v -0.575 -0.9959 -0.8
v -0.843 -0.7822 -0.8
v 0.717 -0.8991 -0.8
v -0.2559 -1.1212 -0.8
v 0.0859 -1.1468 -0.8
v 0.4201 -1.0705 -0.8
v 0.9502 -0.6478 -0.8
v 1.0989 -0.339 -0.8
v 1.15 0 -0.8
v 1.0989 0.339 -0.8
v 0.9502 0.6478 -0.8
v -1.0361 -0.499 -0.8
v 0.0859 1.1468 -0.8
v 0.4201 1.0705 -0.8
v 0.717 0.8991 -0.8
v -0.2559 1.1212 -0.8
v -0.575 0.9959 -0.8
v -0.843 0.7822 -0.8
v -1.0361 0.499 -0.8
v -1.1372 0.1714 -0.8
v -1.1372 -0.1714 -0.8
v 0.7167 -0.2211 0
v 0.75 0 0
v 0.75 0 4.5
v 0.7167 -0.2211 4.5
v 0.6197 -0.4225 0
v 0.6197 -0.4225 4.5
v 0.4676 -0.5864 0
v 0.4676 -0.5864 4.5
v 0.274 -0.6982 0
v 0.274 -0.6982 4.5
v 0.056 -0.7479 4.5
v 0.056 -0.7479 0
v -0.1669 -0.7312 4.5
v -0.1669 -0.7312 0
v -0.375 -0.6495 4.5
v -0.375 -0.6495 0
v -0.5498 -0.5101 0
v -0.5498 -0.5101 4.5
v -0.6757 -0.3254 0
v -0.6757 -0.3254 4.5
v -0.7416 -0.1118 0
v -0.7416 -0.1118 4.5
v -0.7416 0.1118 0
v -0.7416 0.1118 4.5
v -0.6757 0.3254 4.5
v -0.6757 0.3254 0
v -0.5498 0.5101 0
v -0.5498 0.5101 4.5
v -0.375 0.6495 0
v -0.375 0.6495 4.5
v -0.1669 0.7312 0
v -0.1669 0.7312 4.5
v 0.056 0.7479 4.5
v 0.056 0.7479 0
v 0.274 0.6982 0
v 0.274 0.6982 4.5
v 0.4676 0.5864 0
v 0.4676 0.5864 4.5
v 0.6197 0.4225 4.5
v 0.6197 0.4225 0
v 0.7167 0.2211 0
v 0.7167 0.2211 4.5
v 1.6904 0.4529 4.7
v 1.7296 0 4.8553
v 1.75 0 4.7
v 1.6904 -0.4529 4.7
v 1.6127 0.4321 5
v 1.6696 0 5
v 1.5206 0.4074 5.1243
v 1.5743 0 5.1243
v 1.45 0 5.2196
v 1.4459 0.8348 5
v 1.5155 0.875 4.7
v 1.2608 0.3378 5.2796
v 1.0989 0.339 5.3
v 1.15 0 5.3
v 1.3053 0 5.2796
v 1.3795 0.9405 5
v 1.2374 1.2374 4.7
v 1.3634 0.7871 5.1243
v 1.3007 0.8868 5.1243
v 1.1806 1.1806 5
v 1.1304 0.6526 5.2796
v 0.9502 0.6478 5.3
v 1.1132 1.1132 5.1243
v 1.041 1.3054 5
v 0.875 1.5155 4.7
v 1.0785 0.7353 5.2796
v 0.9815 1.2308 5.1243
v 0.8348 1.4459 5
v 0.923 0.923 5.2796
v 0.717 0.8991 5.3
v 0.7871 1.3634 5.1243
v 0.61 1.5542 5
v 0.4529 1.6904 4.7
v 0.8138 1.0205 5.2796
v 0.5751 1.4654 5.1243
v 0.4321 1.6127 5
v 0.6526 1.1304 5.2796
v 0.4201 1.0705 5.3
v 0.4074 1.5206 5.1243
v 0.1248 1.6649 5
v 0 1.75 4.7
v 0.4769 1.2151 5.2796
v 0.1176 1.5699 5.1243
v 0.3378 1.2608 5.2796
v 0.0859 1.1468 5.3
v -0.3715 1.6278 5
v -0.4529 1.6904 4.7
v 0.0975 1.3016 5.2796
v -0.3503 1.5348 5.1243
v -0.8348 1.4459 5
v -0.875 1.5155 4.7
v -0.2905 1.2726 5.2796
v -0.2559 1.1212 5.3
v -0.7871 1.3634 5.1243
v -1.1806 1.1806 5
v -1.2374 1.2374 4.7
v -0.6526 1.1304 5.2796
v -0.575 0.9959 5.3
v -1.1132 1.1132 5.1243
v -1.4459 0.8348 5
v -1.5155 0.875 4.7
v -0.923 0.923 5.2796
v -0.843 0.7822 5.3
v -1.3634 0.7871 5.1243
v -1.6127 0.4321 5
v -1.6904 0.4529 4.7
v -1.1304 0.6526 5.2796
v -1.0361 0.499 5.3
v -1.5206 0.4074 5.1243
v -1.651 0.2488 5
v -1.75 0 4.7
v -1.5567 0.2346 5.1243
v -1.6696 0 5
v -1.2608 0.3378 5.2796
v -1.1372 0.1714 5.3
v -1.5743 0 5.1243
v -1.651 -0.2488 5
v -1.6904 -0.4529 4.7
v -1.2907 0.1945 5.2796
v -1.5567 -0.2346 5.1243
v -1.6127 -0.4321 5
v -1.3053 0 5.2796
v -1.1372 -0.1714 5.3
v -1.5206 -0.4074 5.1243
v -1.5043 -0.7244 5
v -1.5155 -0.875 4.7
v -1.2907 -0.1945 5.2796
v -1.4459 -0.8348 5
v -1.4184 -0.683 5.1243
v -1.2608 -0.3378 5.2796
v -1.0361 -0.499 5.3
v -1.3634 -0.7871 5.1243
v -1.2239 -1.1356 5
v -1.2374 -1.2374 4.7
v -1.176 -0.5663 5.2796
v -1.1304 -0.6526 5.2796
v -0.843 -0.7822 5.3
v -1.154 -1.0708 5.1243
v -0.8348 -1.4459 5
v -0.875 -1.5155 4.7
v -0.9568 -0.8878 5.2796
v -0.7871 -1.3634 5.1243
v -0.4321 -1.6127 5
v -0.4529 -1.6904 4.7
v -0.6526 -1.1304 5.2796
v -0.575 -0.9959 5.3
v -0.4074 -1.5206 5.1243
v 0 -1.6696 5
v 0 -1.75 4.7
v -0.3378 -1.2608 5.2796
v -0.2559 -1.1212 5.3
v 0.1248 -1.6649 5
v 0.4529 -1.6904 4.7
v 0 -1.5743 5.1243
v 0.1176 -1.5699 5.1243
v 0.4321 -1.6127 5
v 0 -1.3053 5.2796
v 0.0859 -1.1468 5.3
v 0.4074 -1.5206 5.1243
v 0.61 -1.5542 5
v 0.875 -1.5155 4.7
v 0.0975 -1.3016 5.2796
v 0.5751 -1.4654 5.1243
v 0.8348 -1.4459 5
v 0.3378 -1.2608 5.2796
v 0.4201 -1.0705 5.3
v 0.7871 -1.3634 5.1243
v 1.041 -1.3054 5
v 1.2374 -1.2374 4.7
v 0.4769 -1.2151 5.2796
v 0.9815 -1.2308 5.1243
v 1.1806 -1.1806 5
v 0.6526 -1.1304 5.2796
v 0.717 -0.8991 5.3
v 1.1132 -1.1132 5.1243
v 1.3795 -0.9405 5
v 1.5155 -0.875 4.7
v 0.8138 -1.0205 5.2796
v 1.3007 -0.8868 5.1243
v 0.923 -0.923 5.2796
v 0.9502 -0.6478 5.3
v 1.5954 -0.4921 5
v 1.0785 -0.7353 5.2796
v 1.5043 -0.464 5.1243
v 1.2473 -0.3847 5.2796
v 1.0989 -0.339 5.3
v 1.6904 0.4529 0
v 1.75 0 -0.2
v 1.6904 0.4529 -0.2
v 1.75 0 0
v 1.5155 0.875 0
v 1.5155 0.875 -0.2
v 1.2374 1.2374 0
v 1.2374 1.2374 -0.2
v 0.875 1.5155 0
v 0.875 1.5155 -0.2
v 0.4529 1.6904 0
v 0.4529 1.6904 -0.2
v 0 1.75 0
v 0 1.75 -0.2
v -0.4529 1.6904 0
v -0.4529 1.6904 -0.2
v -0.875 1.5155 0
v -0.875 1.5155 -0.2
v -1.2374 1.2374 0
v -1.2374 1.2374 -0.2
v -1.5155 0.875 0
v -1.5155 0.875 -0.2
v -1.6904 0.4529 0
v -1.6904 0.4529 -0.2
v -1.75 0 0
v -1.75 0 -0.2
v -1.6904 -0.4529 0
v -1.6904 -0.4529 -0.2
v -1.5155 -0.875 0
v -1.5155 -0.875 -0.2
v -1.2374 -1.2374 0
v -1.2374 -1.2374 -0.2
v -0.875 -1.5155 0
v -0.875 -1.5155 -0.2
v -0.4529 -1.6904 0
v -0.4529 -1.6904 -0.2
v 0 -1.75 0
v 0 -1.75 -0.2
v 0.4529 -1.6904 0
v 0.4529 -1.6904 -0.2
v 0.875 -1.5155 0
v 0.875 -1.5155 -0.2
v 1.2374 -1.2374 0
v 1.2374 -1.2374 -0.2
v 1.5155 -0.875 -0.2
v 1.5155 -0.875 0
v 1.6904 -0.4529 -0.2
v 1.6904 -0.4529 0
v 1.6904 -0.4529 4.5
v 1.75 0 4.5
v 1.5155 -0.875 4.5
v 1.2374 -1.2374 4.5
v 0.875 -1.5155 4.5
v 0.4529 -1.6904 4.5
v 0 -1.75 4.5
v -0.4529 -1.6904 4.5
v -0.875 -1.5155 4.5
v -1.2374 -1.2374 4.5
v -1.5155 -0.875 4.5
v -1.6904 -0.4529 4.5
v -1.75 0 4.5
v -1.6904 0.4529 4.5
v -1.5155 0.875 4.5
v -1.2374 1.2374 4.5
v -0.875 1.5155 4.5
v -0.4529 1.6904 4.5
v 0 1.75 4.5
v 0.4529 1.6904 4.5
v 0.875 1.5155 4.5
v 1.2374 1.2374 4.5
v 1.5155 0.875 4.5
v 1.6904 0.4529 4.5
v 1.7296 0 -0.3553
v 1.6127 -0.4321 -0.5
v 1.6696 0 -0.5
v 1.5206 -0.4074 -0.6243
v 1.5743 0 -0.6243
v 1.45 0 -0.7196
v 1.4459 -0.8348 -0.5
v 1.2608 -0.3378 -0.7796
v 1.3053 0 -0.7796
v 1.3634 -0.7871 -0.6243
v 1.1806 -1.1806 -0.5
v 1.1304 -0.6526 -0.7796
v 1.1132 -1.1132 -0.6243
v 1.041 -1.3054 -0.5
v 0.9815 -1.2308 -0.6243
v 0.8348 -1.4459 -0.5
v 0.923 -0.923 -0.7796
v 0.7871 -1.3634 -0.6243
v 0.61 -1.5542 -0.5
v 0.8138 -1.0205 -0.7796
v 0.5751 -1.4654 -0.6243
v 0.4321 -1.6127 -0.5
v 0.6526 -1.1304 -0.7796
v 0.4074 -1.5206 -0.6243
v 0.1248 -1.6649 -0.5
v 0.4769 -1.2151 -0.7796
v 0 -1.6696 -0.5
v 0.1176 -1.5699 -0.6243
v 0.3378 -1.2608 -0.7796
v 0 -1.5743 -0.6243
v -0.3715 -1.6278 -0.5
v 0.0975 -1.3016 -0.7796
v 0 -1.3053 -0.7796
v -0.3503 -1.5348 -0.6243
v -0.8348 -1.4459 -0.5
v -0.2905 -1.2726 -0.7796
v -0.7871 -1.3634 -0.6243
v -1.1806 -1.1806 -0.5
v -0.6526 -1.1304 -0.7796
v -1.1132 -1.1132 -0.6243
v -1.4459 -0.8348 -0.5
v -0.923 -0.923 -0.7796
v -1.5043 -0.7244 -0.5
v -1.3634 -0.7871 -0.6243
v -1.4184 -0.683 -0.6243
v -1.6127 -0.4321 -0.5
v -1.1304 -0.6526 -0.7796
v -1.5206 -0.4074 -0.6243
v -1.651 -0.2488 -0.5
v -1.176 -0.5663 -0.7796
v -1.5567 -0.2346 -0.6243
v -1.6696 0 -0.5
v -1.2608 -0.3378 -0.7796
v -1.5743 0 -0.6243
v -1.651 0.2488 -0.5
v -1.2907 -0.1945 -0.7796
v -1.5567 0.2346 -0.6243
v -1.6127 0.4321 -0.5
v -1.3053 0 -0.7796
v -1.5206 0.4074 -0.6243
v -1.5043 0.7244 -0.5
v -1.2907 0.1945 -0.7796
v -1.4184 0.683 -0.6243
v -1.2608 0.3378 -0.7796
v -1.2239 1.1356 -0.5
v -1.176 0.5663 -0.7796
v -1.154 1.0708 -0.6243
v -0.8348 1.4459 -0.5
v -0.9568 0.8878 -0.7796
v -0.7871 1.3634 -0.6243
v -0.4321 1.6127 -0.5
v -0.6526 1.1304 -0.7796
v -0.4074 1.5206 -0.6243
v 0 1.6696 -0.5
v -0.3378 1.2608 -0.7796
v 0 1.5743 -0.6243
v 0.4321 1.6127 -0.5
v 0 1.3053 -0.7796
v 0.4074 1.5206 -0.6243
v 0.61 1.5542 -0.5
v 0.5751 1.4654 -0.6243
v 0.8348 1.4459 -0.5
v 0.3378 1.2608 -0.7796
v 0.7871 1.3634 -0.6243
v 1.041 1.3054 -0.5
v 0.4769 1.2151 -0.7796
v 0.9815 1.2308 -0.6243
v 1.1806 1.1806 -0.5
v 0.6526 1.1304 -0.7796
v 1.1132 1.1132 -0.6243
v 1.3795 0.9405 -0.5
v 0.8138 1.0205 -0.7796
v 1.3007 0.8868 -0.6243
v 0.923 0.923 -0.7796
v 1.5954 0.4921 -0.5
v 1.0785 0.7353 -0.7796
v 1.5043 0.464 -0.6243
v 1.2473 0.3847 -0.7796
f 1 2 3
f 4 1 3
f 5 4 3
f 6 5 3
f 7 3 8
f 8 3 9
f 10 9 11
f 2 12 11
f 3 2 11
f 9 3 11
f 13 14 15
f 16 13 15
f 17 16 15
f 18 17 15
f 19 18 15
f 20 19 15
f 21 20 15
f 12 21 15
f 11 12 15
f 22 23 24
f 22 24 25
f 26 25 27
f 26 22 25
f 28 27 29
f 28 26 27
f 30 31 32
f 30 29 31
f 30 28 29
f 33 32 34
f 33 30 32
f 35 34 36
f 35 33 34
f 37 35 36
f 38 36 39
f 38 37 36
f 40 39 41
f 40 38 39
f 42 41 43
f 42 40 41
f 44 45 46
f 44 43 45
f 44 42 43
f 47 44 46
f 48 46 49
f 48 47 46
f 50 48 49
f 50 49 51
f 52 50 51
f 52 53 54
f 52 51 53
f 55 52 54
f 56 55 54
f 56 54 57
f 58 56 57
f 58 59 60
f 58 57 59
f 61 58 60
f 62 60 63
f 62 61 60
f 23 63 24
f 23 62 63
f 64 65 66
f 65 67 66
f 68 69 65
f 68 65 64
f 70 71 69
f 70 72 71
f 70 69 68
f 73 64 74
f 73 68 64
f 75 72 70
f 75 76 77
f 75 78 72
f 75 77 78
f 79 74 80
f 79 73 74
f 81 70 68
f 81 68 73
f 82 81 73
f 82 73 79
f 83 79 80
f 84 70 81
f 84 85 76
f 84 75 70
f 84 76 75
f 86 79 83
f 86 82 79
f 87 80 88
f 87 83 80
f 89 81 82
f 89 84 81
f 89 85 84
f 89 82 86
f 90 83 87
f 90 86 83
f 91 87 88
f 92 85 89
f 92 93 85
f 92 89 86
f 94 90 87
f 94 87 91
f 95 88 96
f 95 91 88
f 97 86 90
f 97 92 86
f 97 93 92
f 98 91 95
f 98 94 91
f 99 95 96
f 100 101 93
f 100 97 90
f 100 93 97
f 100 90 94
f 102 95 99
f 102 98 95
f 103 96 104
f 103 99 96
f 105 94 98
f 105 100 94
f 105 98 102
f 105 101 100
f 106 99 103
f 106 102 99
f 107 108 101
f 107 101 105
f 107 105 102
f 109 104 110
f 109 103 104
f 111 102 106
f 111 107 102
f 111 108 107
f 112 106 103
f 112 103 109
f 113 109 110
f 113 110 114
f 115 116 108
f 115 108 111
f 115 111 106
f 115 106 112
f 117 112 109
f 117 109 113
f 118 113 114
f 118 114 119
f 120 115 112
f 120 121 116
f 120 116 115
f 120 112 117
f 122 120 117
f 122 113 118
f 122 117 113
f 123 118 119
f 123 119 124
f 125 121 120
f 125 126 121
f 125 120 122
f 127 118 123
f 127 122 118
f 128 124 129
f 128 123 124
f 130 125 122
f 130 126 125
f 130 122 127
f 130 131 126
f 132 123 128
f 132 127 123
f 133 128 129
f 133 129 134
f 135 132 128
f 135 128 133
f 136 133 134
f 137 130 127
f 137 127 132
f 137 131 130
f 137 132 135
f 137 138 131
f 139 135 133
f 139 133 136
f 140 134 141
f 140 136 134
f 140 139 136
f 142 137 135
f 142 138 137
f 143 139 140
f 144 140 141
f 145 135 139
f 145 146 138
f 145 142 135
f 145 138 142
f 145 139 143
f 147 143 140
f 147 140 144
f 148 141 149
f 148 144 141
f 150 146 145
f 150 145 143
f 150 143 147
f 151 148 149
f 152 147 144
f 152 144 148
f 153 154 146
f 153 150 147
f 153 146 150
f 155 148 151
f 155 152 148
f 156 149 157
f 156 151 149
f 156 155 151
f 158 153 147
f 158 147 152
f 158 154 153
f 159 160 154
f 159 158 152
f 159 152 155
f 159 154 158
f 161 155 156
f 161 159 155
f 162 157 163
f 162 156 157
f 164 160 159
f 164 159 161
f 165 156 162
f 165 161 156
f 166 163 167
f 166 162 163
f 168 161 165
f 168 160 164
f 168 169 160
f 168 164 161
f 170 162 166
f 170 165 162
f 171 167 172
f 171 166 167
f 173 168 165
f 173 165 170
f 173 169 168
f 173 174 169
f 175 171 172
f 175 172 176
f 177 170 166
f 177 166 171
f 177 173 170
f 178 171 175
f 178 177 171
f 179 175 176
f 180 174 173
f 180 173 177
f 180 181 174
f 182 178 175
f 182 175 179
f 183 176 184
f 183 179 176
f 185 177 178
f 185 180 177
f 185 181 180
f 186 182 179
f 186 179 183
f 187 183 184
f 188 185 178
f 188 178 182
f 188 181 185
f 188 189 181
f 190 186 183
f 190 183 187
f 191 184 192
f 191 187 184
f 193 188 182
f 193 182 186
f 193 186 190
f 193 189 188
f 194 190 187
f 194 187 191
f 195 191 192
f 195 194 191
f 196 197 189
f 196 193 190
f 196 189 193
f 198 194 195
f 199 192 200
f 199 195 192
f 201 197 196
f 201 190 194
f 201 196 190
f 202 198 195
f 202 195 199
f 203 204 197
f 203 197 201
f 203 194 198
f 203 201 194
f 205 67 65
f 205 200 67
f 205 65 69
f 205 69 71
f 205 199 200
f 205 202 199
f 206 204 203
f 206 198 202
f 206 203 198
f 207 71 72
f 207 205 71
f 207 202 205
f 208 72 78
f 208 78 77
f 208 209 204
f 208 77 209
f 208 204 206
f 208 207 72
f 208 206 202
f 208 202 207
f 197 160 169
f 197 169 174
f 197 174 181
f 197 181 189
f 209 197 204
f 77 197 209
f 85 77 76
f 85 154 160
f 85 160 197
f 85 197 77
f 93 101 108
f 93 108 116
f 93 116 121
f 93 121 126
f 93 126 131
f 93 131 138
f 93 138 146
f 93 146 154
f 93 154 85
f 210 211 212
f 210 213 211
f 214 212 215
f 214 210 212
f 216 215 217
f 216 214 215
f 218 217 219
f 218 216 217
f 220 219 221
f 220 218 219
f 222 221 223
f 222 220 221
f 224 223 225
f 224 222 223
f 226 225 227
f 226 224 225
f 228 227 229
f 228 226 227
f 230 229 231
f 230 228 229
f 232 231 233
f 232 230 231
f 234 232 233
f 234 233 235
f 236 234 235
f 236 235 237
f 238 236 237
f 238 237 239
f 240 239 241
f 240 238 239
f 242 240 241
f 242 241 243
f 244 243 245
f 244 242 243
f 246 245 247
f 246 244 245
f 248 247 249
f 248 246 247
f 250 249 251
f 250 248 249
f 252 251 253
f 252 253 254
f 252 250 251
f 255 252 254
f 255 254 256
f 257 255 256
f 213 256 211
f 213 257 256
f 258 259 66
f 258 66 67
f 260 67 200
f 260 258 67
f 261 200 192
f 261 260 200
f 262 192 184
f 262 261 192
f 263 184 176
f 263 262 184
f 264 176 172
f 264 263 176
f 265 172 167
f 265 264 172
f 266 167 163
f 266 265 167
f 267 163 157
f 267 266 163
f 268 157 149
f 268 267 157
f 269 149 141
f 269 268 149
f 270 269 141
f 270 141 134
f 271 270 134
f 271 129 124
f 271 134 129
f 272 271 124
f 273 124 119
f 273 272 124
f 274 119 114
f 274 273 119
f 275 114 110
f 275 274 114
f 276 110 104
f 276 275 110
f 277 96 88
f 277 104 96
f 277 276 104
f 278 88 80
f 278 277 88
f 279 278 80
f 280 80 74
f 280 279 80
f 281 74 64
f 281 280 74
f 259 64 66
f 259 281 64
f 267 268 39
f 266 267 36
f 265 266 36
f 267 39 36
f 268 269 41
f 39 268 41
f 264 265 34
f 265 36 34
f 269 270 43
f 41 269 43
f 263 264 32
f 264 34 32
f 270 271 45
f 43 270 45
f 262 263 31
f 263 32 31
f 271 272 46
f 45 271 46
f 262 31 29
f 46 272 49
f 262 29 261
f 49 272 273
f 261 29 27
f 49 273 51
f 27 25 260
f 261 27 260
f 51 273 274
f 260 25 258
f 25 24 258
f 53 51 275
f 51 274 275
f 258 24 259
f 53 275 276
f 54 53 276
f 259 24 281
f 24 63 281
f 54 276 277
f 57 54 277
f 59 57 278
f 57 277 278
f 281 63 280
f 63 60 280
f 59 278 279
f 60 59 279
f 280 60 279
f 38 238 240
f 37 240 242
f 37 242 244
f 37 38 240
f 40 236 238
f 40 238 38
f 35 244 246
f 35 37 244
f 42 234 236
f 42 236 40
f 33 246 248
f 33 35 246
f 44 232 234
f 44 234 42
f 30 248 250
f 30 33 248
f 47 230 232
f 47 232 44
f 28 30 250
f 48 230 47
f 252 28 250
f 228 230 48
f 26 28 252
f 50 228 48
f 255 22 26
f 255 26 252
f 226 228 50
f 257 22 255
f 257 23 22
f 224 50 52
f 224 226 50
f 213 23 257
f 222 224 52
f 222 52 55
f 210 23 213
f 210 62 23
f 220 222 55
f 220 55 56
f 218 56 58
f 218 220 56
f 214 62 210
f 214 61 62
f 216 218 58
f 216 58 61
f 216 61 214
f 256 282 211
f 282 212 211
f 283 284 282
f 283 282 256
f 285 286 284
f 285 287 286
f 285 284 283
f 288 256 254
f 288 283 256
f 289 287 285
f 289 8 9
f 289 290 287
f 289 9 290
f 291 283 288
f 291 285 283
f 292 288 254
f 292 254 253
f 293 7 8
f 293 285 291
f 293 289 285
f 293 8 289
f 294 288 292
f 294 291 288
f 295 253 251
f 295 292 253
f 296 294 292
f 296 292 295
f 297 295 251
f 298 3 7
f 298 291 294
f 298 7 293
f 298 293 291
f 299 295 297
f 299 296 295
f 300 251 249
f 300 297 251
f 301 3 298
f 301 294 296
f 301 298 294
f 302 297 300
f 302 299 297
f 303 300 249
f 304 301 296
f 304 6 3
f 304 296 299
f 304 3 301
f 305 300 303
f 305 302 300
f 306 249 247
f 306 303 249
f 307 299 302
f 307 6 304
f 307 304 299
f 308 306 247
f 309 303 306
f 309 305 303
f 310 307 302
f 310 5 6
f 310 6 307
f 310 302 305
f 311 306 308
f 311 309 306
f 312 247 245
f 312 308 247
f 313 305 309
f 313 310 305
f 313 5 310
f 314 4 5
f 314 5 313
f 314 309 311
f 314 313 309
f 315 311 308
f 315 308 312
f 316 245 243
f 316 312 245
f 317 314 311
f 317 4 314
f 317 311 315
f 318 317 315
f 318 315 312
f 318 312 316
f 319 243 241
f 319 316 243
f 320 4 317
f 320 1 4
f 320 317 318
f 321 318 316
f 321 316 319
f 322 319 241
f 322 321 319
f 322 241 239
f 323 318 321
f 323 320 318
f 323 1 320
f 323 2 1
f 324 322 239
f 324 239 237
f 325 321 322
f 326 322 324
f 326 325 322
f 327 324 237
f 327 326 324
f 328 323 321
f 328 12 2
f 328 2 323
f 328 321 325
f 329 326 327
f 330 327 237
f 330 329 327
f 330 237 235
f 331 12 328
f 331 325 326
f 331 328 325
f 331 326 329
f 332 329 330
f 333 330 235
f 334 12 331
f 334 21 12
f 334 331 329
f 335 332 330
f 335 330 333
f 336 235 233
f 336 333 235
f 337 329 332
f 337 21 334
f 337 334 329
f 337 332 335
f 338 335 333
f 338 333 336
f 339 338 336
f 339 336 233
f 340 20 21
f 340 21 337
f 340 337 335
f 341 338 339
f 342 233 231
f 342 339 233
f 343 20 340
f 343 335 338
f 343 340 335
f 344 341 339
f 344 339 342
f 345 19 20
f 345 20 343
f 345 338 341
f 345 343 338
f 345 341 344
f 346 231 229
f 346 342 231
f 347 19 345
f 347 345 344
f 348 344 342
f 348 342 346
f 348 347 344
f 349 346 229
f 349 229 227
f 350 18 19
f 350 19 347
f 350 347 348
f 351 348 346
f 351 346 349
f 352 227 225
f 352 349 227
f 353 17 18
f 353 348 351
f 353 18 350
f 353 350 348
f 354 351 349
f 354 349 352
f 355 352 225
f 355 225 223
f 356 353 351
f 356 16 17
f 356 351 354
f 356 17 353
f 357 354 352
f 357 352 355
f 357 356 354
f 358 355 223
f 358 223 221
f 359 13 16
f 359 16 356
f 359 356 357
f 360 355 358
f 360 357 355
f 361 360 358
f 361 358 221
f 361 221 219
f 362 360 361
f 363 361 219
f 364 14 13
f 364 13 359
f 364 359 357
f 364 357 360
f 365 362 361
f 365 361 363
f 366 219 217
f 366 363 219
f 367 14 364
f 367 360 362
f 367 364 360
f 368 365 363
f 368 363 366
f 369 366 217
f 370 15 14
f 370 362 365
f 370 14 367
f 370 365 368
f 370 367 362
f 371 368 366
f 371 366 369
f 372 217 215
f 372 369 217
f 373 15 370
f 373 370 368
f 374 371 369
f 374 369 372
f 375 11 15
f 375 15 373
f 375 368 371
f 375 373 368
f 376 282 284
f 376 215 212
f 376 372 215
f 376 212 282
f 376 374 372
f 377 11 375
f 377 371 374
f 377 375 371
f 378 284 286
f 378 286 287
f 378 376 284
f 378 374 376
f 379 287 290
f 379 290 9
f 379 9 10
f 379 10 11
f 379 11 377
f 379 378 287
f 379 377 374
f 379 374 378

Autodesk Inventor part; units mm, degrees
ref_plane "YZ Plane" through (0, 0, 0) normal (1, 0, 0) x (0, 1, 0)
ref_plane "XZ Plane" through (0, 0, 0) normal (0, 1, 0) x (-1, 0, 0)
ref_plane "XY Plane" through (0, 0, 0) normal (0, 0, 1) x (1, 0, 0)
sketch "Sketch1" plane through (0, 0, 0) normal (0, 0, 1) x (1, 0, 0)
  circle A0 centre (0, 0) radius 0.75
  circle A1 centre (0, 0) radius 1.75
  dimension "d0" = 1.5
  dimension "d3" = 1
extrude "Extrusion1" add sketch "Sketch1" along normal blind 4.5 contours A0
extrude "Extrusion2" add sketch "Sketch1" against normal blind 0.8 contours A0 | A1
sketch "Sketch2" plane through (0, 0, 4.5) normal (0, 0, 1) x (1, 0, 0)
  circle A0 centre (0, 0) radius 1.75 projected
  circle A1 centre (0, 0) radius 0.75 projected
extrude "Extrusion3" add sketch "Sketch2" along normal blind 0.8 contours A0 | A1
fillet "Fillet1" radius 0.6 2 edges at (-1.75, 0, 5.3) (-1.75, 0, -0.8)
properties part number "CNCT_STEEL_Bucket_tooth_mounting_pin" material "Stainless Steel"
